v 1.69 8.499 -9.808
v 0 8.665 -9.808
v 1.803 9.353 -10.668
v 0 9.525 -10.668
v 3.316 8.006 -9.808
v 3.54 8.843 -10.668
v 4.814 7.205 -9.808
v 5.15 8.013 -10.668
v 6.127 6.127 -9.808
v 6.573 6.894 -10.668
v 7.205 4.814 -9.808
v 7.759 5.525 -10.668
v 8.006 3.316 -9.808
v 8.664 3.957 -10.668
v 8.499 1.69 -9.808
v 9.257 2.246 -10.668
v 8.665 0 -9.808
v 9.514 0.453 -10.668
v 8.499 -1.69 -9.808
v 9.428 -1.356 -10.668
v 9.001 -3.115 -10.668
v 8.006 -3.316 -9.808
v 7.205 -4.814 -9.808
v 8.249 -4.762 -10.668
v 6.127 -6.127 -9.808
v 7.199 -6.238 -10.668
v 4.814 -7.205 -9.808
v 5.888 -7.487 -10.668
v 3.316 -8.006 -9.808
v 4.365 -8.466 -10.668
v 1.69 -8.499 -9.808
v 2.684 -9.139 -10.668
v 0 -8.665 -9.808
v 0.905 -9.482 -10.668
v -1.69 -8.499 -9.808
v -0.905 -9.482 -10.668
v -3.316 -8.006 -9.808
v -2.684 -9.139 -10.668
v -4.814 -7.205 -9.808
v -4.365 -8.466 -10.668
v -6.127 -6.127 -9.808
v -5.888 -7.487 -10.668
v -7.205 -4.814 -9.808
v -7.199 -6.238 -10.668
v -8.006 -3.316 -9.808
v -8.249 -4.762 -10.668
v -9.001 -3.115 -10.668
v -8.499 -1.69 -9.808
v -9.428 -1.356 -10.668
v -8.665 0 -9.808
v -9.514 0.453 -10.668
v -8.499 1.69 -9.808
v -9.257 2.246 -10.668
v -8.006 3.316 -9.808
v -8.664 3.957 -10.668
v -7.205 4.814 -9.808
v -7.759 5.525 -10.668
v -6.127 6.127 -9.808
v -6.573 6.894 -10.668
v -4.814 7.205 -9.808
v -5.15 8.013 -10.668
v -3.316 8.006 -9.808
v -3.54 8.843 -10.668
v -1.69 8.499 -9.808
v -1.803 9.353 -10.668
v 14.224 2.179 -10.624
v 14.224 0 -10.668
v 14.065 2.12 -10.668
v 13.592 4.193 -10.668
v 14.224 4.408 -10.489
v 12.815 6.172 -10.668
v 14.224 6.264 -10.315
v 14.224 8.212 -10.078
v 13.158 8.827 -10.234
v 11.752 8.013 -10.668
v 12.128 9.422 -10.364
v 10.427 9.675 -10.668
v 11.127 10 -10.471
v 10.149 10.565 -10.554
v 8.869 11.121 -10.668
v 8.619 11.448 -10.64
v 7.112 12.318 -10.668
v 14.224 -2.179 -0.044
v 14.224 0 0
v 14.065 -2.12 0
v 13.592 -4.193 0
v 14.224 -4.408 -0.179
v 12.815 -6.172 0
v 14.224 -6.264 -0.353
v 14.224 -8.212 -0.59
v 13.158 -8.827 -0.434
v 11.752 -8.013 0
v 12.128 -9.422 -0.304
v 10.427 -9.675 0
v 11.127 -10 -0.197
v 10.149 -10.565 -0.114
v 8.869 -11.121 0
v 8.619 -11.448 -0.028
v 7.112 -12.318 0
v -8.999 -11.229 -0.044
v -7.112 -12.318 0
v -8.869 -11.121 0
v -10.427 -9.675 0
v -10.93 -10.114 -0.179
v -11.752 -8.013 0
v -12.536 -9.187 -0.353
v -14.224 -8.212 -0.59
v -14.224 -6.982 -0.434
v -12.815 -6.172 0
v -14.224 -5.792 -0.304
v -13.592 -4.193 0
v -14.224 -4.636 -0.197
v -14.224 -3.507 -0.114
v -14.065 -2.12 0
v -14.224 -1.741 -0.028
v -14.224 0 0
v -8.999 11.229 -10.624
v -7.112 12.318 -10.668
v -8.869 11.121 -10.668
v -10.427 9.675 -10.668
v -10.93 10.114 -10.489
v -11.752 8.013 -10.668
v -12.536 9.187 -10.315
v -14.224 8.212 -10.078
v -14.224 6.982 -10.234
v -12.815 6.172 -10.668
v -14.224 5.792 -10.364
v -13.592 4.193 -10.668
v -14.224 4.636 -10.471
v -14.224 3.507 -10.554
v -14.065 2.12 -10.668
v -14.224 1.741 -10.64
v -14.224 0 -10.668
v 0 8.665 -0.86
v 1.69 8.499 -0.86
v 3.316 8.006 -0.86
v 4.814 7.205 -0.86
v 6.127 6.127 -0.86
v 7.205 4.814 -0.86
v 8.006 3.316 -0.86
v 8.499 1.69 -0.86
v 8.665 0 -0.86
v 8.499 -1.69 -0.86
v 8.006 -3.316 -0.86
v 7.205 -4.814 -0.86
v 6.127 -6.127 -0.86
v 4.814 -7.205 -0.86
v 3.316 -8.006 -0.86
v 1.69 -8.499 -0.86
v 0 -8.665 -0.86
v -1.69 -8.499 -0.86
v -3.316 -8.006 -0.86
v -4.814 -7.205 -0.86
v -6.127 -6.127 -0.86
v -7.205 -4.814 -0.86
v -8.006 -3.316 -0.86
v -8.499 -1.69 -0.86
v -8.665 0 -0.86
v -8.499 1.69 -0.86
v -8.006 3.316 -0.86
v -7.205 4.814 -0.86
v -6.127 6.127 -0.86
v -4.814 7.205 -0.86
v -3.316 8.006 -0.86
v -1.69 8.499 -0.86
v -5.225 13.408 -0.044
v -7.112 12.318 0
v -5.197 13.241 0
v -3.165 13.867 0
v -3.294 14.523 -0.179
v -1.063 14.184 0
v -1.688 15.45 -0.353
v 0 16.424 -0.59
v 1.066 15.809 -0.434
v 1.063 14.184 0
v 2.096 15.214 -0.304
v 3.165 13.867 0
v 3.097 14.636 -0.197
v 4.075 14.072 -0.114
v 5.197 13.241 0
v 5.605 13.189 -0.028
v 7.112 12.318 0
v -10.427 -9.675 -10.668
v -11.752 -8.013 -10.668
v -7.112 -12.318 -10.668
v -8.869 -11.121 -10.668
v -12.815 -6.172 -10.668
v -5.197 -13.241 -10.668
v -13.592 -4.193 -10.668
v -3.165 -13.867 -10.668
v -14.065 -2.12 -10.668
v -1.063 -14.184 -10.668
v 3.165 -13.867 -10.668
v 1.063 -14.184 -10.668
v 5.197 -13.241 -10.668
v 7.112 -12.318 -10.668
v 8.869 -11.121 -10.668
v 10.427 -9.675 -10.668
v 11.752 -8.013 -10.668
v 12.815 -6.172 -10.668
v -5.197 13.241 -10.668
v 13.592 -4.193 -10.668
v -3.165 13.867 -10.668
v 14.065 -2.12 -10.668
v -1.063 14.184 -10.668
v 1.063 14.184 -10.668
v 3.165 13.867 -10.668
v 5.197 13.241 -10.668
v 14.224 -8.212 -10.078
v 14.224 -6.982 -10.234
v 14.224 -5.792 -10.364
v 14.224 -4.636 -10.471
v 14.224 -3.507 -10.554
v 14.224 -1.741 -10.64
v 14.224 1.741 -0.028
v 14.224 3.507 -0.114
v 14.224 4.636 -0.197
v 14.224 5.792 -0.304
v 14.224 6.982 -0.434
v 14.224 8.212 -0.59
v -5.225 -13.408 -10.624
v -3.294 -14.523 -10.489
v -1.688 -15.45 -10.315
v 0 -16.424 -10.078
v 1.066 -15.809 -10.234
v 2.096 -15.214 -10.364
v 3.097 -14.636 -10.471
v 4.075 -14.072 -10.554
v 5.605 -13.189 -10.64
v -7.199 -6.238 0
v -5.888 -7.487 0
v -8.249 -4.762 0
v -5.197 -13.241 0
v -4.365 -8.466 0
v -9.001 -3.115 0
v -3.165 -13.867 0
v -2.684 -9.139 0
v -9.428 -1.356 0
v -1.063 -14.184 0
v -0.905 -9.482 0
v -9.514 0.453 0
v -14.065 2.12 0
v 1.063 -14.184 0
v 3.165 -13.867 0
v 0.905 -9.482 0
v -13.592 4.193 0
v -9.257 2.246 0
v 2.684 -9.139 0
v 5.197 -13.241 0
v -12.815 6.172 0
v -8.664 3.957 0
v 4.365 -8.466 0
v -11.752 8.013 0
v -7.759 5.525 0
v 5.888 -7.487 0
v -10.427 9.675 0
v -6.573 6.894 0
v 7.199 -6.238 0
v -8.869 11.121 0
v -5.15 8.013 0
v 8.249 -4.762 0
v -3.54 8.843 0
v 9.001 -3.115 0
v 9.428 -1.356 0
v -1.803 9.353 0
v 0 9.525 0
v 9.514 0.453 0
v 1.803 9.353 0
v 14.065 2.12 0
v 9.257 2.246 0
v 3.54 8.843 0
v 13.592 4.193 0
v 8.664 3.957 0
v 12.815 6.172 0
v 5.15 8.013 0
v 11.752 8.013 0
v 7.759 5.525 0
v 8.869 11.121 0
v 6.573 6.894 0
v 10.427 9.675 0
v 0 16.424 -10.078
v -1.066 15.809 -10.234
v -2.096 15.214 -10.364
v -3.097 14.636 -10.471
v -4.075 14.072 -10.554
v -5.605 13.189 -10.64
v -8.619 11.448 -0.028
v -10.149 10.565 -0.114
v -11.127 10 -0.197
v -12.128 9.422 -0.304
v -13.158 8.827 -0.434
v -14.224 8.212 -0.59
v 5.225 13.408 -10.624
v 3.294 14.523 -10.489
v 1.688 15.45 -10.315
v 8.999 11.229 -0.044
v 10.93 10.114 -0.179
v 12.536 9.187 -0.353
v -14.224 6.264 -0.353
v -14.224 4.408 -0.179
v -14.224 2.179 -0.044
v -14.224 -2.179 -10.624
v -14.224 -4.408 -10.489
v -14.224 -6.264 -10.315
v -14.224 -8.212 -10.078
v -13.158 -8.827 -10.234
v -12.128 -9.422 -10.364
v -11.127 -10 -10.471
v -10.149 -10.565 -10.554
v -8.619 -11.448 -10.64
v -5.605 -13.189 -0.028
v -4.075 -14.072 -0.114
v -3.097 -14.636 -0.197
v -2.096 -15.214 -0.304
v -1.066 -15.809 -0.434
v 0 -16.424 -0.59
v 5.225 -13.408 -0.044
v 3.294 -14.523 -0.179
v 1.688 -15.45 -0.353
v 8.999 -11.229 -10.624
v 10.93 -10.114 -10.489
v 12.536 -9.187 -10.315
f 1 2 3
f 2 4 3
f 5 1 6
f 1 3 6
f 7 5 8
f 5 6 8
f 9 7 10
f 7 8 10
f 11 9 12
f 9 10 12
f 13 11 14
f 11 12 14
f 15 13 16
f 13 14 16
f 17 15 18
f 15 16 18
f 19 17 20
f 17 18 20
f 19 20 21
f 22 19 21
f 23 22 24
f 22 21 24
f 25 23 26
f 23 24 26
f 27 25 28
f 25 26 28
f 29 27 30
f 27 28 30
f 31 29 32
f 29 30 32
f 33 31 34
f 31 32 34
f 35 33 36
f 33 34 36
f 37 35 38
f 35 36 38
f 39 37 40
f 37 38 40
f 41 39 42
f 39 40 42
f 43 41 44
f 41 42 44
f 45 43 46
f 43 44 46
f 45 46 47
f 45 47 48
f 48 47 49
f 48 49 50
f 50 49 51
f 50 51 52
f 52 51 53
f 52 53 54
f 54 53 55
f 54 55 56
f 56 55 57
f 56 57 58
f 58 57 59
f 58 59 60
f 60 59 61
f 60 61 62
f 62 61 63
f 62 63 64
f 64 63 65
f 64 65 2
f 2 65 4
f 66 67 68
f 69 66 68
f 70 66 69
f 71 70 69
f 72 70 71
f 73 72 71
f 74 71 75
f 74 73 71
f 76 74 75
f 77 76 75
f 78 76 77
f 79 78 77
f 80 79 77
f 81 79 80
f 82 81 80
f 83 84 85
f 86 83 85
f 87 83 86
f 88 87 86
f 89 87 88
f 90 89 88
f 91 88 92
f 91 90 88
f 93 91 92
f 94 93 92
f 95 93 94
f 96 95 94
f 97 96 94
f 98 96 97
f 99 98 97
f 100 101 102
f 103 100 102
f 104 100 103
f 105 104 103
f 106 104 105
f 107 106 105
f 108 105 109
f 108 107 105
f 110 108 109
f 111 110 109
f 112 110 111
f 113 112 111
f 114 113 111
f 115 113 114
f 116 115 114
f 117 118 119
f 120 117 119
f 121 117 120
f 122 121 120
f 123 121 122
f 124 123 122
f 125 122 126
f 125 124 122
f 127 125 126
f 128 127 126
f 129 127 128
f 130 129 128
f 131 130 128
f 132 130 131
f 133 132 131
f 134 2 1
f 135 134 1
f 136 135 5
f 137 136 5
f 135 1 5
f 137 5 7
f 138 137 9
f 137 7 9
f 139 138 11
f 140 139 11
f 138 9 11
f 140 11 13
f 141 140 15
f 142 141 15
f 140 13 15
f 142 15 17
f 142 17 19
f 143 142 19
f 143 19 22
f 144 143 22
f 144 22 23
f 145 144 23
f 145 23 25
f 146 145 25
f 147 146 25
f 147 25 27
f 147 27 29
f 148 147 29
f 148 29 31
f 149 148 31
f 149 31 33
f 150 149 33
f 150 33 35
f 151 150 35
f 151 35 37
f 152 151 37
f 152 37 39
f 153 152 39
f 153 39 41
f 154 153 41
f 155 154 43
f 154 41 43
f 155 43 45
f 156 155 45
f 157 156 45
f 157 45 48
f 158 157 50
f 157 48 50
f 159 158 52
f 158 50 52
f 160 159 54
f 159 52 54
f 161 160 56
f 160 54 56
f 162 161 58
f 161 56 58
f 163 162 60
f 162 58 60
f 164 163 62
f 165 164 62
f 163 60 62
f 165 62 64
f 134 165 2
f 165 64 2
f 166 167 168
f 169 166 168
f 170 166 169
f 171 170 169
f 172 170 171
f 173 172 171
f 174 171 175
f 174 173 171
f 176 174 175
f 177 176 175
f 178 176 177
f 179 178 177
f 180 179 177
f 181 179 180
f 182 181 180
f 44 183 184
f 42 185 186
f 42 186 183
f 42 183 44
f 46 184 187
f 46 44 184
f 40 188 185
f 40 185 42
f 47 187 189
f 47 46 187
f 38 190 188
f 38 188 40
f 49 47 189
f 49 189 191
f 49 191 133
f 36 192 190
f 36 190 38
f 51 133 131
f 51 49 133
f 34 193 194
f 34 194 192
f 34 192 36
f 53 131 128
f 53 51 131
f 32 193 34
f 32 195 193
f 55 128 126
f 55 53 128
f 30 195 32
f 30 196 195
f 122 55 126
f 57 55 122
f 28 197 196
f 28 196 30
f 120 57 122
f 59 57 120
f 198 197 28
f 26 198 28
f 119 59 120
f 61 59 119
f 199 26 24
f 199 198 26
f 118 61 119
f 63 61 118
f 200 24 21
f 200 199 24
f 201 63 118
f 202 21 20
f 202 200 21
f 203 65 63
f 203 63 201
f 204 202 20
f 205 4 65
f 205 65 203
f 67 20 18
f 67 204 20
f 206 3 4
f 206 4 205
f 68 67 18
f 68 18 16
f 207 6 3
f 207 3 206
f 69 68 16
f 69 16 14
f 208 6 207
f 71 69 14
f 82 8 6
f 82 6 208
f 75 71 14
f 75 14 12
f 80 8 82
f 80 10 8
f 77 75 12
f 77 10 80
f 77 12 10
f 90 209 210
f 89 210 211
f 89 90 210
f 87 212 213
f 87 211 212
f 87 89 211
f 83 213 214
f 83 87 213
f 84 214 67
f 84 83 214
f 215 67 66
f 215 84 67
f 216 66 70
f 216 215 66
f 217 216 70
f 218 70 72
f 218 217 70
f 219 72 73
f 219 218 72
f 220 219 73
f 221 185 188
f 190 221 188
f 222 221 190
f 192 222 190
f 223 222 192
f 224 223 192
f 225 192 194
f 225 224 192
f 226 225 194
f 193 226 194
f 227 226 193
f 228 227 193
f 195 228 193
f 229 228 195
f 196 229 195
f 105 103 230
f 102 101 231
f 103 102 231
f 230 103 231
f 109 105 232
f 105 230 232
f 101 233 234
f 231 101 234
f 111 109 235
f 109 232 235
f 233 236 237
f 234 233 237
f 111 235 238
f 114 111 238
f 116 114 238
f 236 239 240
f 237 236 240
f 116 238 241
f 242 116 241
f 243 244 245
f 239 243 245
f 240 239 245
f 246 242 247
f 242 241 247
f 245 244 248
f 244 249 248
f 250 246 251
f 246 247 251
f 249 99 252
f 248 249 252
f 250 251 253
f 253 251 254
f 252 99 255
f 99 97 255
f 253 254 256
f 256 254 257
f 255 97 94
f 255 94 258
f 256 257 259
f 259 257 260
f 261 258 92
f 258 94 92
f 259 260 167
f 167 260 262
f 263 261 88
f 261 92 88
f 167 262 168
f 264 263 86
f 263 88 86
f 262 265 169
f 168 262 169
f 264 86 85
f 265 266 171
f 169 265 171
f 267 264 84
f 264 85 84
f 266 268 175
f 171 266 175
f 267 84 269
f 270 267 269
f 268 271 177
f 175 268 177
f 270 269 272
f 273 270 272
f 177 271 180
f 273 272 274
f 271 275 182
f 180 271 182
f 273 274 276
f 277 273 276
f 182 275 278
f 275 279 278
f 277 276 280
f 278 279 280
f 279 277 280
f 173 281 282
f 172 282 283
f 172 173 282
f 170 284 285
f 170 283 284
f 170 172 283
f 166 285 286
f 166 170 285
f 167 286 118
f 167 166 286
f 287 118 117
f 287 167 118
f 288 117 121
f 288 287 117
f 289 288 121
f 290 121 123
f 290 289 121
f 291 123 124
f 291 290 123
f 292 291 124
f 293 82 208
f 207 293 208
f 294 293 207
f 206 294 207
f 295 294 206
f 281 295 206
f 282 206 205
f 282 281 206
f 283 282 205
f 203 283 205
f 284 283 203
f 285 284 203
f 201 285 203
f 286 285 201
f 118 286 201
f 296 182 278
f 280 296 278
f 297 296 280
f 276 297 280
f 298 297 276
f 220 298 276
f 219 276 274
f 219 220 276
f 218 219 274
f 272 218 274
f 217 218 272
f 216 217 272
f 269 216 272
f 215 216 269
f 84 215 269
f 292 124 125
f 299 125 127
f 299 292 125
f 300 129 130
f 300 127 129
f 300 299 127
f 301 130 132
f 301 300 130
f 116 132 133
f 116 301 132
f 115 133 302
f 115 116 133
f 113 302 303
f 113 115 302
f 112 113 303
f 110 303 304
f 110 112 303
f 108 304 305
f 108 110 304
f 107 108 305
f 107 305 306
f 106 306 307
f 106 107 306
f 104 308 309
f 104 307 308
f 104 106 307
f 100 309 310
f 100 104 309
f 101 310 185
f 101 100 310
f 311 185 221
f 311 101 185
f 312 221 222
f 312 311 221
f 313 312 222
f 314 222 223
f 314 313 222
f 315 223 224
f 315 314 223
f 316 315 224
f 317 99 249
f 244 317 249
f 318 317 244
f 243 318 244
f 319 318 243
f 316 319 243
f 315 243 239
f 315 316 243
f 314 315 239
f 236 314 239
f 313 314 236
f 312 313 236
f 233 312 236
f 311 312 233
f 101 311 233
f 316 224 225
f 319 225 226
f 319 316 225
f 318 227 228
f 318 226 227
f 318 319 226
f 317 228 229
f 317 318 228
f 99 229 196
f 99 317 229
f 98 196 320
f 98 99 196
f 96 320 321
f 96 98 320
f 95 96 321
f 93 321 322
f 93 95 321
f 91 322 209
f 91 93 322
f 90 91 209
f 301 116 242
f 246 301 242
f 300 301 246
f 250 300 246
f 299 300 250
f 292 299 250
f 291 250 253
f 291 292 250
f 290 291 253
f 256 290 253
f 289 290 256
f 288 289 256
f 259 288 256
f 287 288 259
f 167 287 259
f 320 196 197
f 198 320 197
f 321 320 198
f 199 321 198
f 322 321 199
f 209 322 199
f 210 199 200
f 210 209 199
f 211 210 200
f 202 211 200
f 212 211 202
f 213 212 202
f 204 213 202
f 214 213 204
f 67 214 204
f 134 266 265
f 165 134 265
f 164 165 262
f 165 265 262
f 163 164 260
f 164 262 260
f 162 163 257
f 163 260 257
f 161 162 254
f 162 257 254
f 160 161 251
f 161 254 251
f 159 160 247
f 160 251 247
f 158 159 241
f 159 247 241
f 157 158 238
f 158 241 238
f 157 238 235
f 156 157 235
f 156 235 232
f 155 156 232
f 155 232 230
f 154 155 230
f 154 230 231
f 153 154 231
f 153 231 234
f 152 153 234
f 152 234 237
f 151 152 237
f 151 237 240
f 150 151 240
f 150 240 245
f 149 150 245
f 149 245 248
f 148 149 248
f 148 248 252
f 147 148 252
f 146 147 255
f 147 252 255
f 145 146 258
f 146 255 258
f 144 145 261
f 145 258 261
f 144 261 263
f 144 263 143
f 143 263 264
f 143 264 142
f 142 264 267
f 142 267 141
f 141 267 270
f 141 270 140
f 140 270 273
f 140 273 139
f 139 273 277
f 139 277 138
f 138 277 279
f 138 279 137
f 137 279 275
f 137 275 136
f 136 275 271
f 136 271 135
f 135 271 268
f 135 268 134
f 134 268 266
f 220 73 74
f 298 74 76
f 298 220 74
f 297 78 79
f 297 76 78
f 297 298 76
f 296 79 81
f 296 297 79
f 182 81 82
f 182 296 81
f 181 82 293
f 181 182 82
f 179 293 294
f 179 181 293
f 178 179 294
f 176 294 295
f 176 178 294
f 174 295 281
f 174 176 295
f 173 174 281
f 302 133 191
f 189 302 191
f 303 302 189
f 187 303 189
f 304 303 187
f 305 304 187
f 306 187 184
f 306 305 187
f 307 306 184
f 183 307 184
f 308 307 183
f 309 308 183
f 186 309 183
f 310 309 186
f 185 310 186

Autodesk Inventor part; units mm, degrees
sketch "Sketch_8" plane through (0, 0, 0) normal (1, 0, 0) x (0, 1, 0)
  line L0 (0, -10.668) -> (0, 0)
  line L1 (0, 0) -> (14.224, 0)
  line L2 (14.224, 0) -> (17.0688, -0.7623)
  line L3 (17.0688, -0.7623) -> (17.0688, -9.9057)
  line L4 (17.0688, -9.9057) -> (14.224, -10.668)
  line L5 (14.224, -10.668) -> (0, -10.668)
  line L6 (0, -10.668) -> (0, 0)
sketch "Sketch_10" plane through (0, 0, 0) normal (0, 0, 1) x (1, 0, 0)
  line L0 (-28.448, -28.448) -> (28.448, -28.448)
  line L1 (28.448, -28.448) -> (28.448, 28.448)
  line L2 (28.448, 28.448) -> (-28.448, 28.448)
  line L3 (-28.448, 28.448) -> (-28.448, -28.448)
  line L4 (-14.224, -8.2122) -> (0, -16.4245)
  line L5 (0, -16.4245) -> (14.224, -8.2122)
  line L6 (14.224, -8.2122) -> (14.224, 8.2122)
  line L7 (14.224, 8.2122) -> (0, 16.4245)
  line L8 (0, 16.4245) -> (-14.224, 8.2122)
  line L9 (-14.224, 8.2122) -> (-14.224, -8.2122)
revolve "Revolution1" add sketch "Sketch_8" angle 360 about axis through (0, 0, -10.668) along (0, 0, -1)
extrude "Extrusion1" cut sketch "Sketch_10" against normal blind 10.668
sketch "Sketch_11" plane through (0, 0, 0) normal (1, 0, 0) x (0, 1, 0)
  line L0 (0, -10.668) -> (0, 0)
  line L1 (0, 0) -> (9.525, 0)
  line L2 (9.525, 0) -> (8.6652, -0.8598)
  line L3 (8.6652, -0.8598) -> (8.6652, -9.8082)
  line L4 (8.6652, -9.8082) -> (9.525, -10.668)
  line L5 (9.525, -10.668) -> (0, -10.668)
  line L6 (0, -10.668) -> (0, 0)
revolve "Revolution2" cut sketch "Sketch_11" angle 360 about axis through (0, 0, -10.668) along (0, 0, -1)
thread "Thread1" size "3/4-16 UNF" class "2B" standard "ANSI Unified Screw Threads" full length
ref_plane "NUT_XY" through (0, 0, 0) normal (0, 0, 1) x (1, 0, 0)
ref_plane "NUT_YZ" through (0, 0, 0) normal (1, 0, 0) x (0, 1, 0)
ref_plane "NUT_ZX" through (0, 0, 0) normal (0, 1, 0) x (0, 0, 1)
ref_plane "a1_XY" through (-14.224, 14.224, 0) normal (0, 0, 1) x (1, 0, 0)
ref_plane "a1_YZ" through (-14.224, 14.224, 0) normal (1, 0, 0) x (0, 1, 0)
ref_plane "a1_ZX" through (-14.224, 14.224, 0) normal (0, 1, 0) x (0, 0, 1)
ref_plane "a2_XY" through (14.224, 14.224, 0) normal (0, 0, 1) x (1, 0, 0)
ref_plane "a2_YZ" through (14.224, 14.224, 0) normal (1, 0, 0) x (0, 1, 0)
ref_plane "a2_ZX" through (14.224, 14.224, 0) normal (0, 1, 0) x (0, 0, 1)
ref_plane "b1_XY" through (0, 14.224, 0) normal (1, 0, 0) x (0, 0, -1)
ref_plane "b1_YZ" through (0, 14.224, 0) normal (0, 0, -1) x (0, 1, 0)
ref_plane "b1_ZX" through (0, 14.224, 0) normal (0, 1, 0) x (1, 0, 0)
ref_plane "b2_XY" through (0, 14.224, -10.668) normal (1, 0, 0) x (0, 0, -1)
ref_plane "b2_YZ" through (0, 14.224, -10.668) normal (0, 0, -1) x (0, 1, 0)
ref_plane "b2_ZX" through (0, 14.224, -10.668) normal (0, 1, 0) x (1, 0, 0)
ref_plane "e_XY" through (0, 0, -10.668) normal (1, 0, 0) x (0, 0, -1)
ref_plane "e_YZ" through (0, 0, -10.668) normal (0, 0, -1) x (0, 1, 0)
ref_plane "e_ZX" through (0, 0, -10.668) normal (0, 1, 0) x (1, 0, 0)
ref_plane "ol1_XY" through (0, 0, -14.224) normal (0, 1, 0) x (1, 0, 0)
ref_plane "ol1_YZ" through (0, 0, -14.224) normal (1, 0, 0) x (0, 0, -1)
ref_plane "ol1_ZX" through (0, 0, -14.224) normal (0, 0, -1) x (0, 1, 0)
ref_plane "ol2_XY" through (10.668, 0, -14.224) normal (0, 1, 0) x (1, 0, 0)
ref_plane "ol2_YZ" through (10.668, 0, -14.224) normal (1, 0, 0) x (0, 0, -1)
ref_plane "ol2_ZX" through (10.668, 0, -14.224) normal (0, 0, -1) x (0, 1, 0)
ref_plane "th1_XY" through (0, 9.525, -10.668) normal (1, 0, 0) x (0, 0, -1)
ref_plane "th1_YZ" through (0, 9.525, -10.668) normal (0, 0, -1) x (0, 1, 0)
ref_plane "th1_ZX" through (0, 9.525, -10.668) normal (0, 1, 0) x (1, 0, 0)
ref_plane "th2_XY" through (0, -9.525, -10.668) normal (1, 0, 0) x (0, 0, -1)
ref_plane "th2_YZ" through (0, -9.525, -10.668) normal (0, 0, -1) x (0, 1, 0)
ref_plane "th2_ZX" through (0, -9.525, -10.668) normal (0, 1, 0) x (1, 0, 0)
properties part number "D-3556"
